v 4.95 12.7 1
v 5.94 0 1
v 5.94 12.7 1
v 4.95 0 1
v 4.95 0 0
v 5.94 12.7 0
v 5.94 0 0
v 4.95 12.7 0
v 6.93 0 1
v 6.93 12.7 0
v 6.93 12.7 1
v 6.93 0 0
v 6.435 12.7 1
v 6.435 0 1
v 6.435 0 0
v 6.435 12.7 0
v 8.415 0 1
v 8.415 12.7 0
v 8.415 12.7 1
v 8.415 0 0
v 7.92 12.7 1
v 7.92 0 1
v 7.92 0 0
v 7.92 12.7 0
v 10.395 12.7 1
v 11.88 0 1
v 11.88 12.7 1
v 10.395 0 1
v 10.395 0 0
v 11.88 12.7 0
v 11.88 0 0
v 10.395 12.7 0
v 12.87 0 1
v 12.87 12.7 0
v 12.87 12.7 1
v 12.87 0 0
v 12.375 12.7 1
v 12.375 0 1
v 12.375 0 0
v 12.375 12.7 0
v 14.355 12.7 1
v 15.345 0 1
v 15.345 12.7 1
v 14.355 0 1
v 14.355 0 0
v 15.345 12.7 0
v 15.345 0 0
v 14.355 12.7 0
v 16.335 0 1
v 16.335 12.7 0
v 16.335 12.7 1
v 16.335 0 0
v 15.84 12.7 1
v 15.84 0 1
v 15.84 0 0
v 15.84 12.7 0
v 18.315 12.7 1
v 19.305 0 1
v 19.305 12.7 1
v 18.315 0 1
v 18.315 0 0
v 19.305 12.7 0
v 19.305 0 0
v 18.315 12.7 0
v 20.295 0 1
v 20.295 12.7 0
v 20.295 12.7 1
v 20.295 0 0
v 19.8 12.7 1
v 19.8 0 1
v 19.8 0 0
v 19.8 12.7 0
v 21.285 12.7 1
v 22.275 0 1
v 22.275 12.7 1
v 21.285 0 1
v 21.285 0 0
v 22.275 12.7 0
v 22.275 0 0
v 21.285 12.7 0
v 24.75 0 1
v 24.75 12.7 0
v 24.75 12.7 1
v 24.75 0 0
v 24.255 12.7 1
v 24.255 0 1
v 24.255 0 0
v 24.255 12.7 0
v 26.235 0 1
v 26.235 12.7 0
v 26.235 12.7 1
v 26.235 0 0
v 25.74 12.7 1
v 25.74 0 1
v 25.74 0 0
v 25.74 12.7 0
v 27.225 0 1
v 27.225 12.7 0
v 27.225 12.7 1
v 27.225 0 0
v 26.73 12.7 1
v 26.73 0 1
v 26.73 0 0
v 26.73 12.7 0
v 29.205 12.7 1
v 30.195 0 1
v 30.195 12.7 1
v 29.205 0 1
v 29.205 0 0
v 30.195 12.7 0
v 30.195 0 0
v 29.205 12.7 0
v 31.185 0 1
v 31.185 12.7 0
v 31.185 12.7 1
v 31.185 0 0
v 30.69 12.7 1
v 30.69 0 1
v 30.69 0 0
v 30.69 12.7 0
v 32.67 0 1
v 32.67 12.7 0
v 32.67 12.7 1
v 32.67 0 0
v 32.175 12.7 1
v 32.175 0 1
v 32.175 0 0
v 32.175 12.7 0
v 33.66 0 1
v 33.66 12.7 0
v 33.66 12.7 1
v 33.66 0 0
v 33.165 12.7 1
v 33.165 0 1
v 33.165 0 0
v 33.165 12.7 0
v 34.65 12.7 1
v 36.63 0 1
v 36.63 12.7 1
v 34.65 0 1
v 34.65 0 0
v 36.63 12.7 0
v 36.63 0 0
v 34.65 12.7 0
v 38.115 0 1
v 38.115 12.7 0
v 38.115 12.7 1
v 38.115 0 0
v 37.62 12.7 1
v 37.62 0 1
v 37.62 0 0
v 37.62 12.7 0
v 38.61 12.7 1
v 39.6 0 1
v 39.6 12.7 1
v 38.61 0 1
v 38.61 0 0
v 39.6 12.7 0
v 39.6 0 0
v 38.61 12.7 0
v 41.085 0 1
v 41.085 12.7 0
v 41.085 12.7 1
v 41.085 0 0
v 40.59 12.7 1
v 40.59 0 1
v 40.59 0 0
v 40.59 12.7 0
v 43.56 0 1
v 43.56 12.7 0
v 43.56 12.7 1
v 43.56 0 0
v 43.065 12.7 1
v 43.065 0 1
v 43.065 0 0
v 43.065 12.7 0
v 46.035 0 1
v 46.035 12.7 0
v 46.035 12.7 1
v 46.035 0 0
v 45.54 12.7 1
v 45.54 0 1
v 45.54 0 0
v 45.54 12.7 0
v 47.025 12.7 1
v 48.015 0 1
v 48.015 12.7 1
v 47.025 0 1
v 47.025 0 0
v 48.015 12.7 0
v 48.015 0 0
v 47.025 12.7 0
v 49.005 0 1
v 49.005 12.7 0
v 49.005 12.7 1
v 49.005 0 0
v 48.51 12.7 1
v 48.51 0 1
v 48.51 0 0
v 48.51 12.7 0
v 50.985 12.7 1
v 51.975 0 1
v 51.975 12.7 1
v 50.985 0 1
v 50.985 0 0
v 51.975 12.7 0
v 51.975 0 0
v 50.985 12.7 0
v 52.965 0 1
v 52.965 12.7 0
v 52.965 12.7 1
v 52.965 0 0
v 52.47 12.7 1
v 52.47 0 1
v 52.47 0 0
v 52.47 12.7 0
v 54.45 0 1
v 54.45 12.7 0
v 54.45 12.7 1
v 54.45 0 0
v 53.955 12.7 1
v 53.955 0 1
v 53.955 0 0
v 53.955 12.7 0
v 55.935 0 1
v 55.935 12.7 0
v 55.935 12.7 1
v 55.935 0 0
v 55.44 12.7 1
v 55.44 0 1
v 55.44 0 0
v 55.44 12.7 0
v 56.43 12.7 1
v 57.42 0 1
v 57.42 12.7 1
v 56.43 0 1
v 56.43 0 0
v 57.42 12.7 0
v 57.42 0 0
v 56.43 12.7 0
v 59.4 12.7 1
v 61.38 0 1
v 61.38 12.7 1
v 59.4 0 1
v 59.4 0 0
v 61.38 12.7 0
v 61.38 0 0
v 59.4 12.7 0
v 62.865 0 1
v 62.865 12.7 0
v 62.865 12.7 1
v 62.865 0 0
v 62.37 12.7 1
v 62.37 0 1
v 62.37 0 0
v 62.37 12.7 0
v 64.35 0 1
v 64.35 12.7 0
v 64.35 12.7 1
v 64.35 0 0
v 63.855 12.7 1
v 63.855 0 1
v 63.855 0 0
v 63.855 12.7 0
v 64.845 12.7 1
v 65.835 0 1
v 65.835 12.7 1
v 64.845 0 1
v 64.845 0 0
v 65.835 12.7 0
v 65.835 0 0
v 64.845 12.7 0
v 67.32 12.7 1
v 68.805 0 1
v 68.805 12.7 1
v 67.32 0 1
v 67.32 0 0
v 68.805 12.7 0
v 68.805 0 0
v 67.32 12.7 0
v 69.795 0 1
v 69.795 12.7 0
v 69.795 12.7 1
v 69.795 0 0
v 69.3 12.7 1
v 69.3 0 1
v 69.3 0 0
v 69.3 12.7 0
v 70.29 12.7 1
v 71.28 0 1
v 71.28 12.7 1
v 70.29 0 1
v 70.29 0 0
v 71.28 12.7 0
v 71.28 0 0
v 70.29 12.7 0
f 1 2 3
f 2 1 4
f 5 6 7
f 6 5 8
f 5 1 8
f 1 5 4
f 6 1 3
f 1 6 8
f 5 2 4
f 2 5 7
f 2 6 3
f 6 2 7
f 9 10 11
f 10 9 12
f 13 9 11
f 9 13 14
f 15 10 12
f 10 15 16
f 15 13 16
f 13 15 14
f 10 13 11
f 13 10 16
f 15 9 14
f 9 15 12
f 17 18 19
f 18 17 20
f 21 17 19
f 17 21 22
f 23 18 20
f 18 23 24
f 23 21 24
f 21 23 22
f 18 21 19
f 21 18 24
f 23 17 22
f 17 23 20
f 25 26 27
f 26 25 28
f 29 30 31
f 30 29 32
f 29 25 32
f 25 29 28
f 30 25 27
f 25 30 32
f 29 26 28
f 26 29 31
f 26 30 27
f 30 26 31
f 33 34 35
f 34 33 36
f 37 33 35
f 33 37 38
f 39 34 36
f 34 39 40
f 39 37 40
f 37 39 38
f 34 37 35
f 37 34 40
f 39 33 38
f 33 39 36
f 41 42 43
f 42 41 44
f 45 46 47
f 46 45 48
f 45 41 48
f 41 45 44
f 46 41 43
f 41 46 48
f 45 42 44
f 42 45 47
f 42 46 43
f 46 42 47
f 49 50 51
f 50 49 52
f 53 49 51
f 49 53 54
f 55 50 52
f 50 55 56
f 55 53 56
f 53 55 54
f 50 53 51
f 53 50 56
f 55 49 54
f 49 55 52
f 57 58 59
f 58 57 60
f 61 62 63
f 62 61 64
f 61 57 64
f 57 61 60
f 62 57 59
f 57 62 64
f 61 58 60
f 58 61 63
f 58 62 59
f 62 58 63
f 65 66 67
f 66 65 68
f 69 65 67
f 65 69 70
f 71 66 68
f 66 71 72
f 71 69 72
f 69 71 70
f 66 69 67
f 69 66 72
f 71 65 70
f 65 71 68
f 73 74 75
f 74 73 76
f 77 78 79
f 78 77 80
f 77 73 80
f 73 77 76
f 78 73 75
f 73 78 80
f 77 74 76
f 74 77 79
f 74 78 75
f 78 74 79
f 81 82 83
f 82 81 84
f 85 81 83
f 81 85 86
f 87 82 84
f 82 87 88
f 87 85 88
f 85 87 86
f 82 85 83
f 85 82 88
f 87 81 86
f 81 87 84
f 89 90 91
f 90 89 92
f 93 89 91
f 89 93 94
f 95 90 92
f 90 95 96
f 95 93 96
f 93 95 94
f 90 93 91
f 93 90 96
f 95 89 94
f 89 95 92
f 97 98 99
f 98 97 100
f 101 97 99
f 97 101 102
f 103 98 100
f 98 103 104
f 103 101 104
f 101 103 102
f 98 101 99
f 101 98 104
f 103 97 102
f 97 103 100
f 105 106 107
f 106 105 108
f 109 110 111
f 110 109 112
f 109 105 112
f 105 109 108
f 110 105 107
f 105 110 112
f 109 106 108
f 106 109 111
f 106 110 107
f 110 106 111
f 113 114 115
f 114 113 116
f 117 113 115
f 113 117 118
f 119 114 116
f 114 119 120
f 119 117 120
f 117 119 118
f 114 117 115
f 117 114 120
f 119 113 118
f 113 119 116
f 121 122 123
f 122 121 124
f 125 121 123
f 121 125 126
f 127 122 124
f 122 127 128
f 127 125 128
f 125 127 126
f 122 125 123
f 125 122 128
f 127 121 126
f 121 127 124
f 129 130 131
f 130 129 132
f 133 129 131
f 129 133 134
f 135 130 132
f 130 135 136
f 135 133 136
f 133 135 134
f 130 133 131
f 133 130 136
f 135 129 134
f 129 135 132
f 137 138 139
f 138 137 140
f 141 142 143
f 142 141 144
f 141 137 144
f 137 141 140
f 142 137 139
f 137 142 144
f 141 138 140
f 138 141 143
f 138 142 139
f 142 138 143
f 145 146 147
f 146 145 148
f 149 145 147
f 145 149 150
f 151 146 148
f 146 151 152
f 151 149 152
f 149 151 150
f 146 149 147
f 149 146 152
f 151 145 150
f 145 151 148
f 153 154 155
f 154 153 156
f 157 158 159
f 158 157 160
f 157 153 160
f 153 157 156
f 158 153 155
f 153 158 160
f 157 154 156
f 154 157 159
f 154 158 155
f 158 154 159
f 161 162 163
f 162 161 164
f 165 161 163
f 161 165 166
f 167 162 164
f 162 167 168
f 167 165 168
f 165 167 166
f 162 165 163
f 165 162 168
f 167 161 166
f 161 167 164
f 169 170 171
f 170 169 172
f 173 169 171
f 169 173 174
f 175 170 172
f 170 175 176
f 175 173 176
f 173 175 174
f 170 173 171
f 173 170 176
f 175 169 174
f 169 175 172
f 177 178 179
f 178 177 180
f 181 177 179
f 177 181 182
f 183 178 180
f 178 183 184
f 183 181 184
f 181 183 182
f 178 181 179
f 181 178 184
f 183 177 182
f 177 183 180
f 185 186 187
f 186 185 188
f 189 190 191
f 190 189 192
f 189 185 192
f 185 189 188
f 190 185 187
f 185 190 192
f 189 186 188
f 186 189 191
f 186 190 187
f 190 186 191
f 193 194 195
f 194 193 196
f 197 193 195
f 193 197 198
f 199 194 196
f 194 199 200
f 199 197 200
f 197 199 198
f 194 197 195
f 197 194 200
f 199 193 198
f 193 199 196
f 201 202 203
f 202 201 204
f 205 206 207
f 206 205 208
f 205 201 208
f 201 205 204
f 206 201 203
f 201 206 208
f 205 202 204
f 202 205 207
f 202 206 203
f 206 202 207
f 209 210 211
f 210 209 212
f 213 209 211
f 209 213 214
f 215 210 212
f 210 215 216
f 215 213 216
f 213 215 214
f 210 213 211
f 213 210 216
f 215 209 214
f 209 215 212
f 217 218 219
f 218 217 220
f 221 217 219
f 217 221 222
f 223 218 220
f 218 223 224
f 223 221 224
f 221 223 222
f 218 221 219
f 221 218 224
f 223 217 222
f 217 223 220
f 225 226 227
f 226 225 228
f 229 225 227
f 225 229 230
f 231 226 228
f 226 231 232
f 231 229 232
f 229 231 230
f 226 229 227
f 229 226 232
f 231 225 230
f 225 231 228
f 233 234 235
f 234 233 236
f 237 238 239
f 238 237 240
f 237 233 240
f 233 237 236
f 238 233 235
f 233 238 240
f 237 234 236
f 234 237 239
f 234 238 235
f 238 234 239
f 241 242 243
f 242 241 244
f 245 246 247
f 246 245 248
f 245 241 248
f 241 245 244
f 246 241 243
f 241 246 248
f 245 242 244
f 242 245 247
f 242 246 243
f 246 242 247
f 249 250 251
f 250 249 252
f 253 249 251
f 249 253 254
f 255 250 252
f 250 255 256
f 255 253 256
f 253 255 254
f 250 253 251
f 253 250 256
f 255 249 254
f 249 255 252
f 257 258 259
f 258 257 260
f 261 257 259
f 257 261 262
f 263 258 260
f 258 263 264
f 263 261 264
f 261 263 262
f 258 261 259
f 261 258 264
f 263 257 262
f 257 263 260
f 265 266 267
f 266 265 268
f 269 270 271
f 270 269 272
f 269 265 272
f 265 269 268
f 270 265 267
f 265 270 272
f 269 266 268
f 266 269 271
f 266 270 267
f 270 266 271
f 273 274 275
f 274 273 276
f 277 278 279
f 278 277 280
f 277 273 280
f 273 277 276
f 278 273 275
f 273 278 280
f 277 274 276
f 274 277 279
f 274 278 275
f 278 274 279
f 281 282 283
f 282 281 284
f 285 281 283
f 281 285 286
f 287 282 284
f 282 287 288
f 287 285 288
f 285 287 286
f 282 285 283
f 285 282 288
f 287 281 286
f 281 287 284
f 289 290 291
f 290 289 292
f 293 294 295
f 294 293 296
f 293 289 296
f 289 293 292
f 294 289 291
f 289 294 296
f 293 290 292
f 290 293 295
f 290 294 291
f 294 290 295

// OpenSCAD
// file: ../../util/bitmap.scad
/*****************************************************************************
 * Module Bitmap Library
 * Modules to create bitmaps of unit squares from 1 or 2 dimensional vectors.
 *****************************************************************************
 * Copyright 2017 Chris Baker
 *
 * This program is free software: you can redistribute it and/or modify
 * it under the terms of the GNU Lesser General Public License as published by
 * the Free Software Foundation, either version 3 of the License, or
 * (at your option) any later version.
 *
 * This program is distributed in the hope that it will be useful,
 * but WITHOUT ANY WARRANTY; without even the implied warranty of
 * MERCHANTABILITY or FITNESS FOR A PARTICULAR PURPOSE.  See the
 * GNU Lesser General Public License for more details.
 *
 * You should have received a copy of the GNU Lesser General Public License
 * along with this program.  If not, see <http://www.gnu.org/licenses/>.
 *****************************************************************************
 * Usage:
 * Include this file with the "use" tag.
 * Depends on compat.scad library.
 *
 * API:
 *   1dbitmap(bitmap, center, expansion, vector_mode)
 *   2dbitmap(bitmap, center, expansion, vector_mode)
 *     Generate a 1 or 2-Dimensional field of modules based on the provided
 *     bitmap vector. See Bitmap Vectors below.
 *     The center flag determines whether to center the bitmap on the origin.
 *     The expansion value actually shrinks each cube in the x and y
 *     dimension by the specified amount.
 *     The vector_mode flag determines whether to create 3D solid geometry
 *     (unit cubes) or 2D vector geometry (squares).
 *
 * Bitmap Vectors:
 *   The bitmap vectors primarily provide boolean information.
 *   A module will be placed where these vectors have a postive value and
 *   skipped where they have a negative value. I.E. 0, -1, false, and undef
 *   are all equivalent and result in a skip. 1 and true are equivalent and
 *   result in a placed 1-unit module.
 *   Further, if the value is an integer it will be treated as a height for
 *   the module, allowing z-maps to be created.
 *   If the value is not an integer or boolean, it will be treated as a color
 *   reference. This can be a string or RGBA vector that will be used to
 *   color the module in the OpenSCAD preview window.
 *   In current versions of OpenSCAD, the color has no effect in the rendered
 *   view or STL output.
 *
 * Vector Mode:
 *   Although OpenSCAD supports generating 2D geometry, there are several
 *   caveats:
 *   - 2D and 3D geometry cannot be mixed
 *   - Extruding 2D geometry causes color information to be lost
 *   - All 2D geometry is projected onto the XY plane when rendering
 *   - Rendering also results in loss of color (same as 3D)
 *   - The SVG exporter is somewhat limited:
 *     - The pixel size of the image is hard-coded in the file
 *     - The title of the image is a generic string
 *     - The color selection for stroke and fill is fixed
 *     - The stroke-width is set to a large value that will cause overlap
 *     - The background is transparent
 *     - Only one path element is created with all of the geometry; there is
 *       no easy way to split up the geometry into multiple logical units.
 *     - These issues can mostly be resolved by hand-editing the file:
 *       - Remove or modify the width and height parameters from the svg
 *         element at the top of the file to provide better scaling.
 *       - Edit the title element at the top of the file to change the title.
 *       - Edit the stroke and fill parameters of the path element (these will
 *         probably be at the end of the file).
 *       - Set the stroke-width parameter for the path element to 0.
 *****************************************************************************/
use <compat.scad>

/*
 * 2dbitmap - Turn a 2D vector into a bitmap of cubes
 *
 * bitmap - 2D vector representing where to place each cube
 *          Value can either be boolean, z-height, or color
 * center - center cubes around the origin
 * expansion - size of gap around each pixel (screendoor)
 * vector_mode - create a 2D vector drawing instead of 3D extrusion
 */
module 2dbitmap(bitmap=[[1,0],[0,1]], center=false, expansion=0, vector_mode=false)
{
	ylen=len(bitmap)-1;

	for (y=[0:ylen]) {
		xlen=len(bitmap[y])-1;
		for (x=[0:xlen])
			translate([x-(center?xlen/2:0),ylen-y-(center?ylen/2:0),0])
				if (is_indexable(bitmap[y][x]))
					color(bitmap[y][x])
						if (vector_mode)
							square([1-expansion,1-expansion], center=center);
						else
							cube([1-expansion,1-expansion,1], center=center);
				else
					if (bitmap[y][x])
						if (vector_mode)
							square([1-expansion,1-expansion], center=center);
						else
							cube([1-expansion,1-expansion,clamp_nonnum(bitmap[y][x])], center=center);
	}
}

module 1dbitmap(bitmap=[1,0,1,0,1], center=false, expansion=0, vector_mode=false)
	2dbitmap([bitmap], center, expansion, vector_mode);

/*
 * Examples
 */

// 1D with z-height
translate([10,0,0]) scale([1,10,1])
	1dbitmap(bitmap=[1,1,0,2,0,0,3], expansion=.1);

// 1D with boolean
translate([-20,0,0]) scale([1,10,1])
	1dbitmap(bitmap=[true,false,true,false,true,true]);

// 2D with z-height
scale([2,2,1])
	2dbitmap(bitmap=[[1,0,2,1],[0,3,3,0],[1,1,0,1]],
		center=true);

// 1D with color
translate([0,-10,0]) scale([1,3,1])
	1dbitmap(bitmap=["red","white","blue",[0,0.3,0,0.5]]);

// 1D with color using 2D-vector-mode
translate([-7,-8,0]) scale([1,2])
	1dbitmap(bitmap=["red",0,"blue",0,"green"], vector_mode=true);
translate([-4.5,-10,0]) scale([1,2])
	1dbitmap(bitmap=["red",0,"blue",0,"green"], vector_mode=true, center=true);
// main file
/* Unit Test 06: bar="blue" */
use <../code128.scad>

code_128(cs128_b("Wikipedia"), bar="blue");
